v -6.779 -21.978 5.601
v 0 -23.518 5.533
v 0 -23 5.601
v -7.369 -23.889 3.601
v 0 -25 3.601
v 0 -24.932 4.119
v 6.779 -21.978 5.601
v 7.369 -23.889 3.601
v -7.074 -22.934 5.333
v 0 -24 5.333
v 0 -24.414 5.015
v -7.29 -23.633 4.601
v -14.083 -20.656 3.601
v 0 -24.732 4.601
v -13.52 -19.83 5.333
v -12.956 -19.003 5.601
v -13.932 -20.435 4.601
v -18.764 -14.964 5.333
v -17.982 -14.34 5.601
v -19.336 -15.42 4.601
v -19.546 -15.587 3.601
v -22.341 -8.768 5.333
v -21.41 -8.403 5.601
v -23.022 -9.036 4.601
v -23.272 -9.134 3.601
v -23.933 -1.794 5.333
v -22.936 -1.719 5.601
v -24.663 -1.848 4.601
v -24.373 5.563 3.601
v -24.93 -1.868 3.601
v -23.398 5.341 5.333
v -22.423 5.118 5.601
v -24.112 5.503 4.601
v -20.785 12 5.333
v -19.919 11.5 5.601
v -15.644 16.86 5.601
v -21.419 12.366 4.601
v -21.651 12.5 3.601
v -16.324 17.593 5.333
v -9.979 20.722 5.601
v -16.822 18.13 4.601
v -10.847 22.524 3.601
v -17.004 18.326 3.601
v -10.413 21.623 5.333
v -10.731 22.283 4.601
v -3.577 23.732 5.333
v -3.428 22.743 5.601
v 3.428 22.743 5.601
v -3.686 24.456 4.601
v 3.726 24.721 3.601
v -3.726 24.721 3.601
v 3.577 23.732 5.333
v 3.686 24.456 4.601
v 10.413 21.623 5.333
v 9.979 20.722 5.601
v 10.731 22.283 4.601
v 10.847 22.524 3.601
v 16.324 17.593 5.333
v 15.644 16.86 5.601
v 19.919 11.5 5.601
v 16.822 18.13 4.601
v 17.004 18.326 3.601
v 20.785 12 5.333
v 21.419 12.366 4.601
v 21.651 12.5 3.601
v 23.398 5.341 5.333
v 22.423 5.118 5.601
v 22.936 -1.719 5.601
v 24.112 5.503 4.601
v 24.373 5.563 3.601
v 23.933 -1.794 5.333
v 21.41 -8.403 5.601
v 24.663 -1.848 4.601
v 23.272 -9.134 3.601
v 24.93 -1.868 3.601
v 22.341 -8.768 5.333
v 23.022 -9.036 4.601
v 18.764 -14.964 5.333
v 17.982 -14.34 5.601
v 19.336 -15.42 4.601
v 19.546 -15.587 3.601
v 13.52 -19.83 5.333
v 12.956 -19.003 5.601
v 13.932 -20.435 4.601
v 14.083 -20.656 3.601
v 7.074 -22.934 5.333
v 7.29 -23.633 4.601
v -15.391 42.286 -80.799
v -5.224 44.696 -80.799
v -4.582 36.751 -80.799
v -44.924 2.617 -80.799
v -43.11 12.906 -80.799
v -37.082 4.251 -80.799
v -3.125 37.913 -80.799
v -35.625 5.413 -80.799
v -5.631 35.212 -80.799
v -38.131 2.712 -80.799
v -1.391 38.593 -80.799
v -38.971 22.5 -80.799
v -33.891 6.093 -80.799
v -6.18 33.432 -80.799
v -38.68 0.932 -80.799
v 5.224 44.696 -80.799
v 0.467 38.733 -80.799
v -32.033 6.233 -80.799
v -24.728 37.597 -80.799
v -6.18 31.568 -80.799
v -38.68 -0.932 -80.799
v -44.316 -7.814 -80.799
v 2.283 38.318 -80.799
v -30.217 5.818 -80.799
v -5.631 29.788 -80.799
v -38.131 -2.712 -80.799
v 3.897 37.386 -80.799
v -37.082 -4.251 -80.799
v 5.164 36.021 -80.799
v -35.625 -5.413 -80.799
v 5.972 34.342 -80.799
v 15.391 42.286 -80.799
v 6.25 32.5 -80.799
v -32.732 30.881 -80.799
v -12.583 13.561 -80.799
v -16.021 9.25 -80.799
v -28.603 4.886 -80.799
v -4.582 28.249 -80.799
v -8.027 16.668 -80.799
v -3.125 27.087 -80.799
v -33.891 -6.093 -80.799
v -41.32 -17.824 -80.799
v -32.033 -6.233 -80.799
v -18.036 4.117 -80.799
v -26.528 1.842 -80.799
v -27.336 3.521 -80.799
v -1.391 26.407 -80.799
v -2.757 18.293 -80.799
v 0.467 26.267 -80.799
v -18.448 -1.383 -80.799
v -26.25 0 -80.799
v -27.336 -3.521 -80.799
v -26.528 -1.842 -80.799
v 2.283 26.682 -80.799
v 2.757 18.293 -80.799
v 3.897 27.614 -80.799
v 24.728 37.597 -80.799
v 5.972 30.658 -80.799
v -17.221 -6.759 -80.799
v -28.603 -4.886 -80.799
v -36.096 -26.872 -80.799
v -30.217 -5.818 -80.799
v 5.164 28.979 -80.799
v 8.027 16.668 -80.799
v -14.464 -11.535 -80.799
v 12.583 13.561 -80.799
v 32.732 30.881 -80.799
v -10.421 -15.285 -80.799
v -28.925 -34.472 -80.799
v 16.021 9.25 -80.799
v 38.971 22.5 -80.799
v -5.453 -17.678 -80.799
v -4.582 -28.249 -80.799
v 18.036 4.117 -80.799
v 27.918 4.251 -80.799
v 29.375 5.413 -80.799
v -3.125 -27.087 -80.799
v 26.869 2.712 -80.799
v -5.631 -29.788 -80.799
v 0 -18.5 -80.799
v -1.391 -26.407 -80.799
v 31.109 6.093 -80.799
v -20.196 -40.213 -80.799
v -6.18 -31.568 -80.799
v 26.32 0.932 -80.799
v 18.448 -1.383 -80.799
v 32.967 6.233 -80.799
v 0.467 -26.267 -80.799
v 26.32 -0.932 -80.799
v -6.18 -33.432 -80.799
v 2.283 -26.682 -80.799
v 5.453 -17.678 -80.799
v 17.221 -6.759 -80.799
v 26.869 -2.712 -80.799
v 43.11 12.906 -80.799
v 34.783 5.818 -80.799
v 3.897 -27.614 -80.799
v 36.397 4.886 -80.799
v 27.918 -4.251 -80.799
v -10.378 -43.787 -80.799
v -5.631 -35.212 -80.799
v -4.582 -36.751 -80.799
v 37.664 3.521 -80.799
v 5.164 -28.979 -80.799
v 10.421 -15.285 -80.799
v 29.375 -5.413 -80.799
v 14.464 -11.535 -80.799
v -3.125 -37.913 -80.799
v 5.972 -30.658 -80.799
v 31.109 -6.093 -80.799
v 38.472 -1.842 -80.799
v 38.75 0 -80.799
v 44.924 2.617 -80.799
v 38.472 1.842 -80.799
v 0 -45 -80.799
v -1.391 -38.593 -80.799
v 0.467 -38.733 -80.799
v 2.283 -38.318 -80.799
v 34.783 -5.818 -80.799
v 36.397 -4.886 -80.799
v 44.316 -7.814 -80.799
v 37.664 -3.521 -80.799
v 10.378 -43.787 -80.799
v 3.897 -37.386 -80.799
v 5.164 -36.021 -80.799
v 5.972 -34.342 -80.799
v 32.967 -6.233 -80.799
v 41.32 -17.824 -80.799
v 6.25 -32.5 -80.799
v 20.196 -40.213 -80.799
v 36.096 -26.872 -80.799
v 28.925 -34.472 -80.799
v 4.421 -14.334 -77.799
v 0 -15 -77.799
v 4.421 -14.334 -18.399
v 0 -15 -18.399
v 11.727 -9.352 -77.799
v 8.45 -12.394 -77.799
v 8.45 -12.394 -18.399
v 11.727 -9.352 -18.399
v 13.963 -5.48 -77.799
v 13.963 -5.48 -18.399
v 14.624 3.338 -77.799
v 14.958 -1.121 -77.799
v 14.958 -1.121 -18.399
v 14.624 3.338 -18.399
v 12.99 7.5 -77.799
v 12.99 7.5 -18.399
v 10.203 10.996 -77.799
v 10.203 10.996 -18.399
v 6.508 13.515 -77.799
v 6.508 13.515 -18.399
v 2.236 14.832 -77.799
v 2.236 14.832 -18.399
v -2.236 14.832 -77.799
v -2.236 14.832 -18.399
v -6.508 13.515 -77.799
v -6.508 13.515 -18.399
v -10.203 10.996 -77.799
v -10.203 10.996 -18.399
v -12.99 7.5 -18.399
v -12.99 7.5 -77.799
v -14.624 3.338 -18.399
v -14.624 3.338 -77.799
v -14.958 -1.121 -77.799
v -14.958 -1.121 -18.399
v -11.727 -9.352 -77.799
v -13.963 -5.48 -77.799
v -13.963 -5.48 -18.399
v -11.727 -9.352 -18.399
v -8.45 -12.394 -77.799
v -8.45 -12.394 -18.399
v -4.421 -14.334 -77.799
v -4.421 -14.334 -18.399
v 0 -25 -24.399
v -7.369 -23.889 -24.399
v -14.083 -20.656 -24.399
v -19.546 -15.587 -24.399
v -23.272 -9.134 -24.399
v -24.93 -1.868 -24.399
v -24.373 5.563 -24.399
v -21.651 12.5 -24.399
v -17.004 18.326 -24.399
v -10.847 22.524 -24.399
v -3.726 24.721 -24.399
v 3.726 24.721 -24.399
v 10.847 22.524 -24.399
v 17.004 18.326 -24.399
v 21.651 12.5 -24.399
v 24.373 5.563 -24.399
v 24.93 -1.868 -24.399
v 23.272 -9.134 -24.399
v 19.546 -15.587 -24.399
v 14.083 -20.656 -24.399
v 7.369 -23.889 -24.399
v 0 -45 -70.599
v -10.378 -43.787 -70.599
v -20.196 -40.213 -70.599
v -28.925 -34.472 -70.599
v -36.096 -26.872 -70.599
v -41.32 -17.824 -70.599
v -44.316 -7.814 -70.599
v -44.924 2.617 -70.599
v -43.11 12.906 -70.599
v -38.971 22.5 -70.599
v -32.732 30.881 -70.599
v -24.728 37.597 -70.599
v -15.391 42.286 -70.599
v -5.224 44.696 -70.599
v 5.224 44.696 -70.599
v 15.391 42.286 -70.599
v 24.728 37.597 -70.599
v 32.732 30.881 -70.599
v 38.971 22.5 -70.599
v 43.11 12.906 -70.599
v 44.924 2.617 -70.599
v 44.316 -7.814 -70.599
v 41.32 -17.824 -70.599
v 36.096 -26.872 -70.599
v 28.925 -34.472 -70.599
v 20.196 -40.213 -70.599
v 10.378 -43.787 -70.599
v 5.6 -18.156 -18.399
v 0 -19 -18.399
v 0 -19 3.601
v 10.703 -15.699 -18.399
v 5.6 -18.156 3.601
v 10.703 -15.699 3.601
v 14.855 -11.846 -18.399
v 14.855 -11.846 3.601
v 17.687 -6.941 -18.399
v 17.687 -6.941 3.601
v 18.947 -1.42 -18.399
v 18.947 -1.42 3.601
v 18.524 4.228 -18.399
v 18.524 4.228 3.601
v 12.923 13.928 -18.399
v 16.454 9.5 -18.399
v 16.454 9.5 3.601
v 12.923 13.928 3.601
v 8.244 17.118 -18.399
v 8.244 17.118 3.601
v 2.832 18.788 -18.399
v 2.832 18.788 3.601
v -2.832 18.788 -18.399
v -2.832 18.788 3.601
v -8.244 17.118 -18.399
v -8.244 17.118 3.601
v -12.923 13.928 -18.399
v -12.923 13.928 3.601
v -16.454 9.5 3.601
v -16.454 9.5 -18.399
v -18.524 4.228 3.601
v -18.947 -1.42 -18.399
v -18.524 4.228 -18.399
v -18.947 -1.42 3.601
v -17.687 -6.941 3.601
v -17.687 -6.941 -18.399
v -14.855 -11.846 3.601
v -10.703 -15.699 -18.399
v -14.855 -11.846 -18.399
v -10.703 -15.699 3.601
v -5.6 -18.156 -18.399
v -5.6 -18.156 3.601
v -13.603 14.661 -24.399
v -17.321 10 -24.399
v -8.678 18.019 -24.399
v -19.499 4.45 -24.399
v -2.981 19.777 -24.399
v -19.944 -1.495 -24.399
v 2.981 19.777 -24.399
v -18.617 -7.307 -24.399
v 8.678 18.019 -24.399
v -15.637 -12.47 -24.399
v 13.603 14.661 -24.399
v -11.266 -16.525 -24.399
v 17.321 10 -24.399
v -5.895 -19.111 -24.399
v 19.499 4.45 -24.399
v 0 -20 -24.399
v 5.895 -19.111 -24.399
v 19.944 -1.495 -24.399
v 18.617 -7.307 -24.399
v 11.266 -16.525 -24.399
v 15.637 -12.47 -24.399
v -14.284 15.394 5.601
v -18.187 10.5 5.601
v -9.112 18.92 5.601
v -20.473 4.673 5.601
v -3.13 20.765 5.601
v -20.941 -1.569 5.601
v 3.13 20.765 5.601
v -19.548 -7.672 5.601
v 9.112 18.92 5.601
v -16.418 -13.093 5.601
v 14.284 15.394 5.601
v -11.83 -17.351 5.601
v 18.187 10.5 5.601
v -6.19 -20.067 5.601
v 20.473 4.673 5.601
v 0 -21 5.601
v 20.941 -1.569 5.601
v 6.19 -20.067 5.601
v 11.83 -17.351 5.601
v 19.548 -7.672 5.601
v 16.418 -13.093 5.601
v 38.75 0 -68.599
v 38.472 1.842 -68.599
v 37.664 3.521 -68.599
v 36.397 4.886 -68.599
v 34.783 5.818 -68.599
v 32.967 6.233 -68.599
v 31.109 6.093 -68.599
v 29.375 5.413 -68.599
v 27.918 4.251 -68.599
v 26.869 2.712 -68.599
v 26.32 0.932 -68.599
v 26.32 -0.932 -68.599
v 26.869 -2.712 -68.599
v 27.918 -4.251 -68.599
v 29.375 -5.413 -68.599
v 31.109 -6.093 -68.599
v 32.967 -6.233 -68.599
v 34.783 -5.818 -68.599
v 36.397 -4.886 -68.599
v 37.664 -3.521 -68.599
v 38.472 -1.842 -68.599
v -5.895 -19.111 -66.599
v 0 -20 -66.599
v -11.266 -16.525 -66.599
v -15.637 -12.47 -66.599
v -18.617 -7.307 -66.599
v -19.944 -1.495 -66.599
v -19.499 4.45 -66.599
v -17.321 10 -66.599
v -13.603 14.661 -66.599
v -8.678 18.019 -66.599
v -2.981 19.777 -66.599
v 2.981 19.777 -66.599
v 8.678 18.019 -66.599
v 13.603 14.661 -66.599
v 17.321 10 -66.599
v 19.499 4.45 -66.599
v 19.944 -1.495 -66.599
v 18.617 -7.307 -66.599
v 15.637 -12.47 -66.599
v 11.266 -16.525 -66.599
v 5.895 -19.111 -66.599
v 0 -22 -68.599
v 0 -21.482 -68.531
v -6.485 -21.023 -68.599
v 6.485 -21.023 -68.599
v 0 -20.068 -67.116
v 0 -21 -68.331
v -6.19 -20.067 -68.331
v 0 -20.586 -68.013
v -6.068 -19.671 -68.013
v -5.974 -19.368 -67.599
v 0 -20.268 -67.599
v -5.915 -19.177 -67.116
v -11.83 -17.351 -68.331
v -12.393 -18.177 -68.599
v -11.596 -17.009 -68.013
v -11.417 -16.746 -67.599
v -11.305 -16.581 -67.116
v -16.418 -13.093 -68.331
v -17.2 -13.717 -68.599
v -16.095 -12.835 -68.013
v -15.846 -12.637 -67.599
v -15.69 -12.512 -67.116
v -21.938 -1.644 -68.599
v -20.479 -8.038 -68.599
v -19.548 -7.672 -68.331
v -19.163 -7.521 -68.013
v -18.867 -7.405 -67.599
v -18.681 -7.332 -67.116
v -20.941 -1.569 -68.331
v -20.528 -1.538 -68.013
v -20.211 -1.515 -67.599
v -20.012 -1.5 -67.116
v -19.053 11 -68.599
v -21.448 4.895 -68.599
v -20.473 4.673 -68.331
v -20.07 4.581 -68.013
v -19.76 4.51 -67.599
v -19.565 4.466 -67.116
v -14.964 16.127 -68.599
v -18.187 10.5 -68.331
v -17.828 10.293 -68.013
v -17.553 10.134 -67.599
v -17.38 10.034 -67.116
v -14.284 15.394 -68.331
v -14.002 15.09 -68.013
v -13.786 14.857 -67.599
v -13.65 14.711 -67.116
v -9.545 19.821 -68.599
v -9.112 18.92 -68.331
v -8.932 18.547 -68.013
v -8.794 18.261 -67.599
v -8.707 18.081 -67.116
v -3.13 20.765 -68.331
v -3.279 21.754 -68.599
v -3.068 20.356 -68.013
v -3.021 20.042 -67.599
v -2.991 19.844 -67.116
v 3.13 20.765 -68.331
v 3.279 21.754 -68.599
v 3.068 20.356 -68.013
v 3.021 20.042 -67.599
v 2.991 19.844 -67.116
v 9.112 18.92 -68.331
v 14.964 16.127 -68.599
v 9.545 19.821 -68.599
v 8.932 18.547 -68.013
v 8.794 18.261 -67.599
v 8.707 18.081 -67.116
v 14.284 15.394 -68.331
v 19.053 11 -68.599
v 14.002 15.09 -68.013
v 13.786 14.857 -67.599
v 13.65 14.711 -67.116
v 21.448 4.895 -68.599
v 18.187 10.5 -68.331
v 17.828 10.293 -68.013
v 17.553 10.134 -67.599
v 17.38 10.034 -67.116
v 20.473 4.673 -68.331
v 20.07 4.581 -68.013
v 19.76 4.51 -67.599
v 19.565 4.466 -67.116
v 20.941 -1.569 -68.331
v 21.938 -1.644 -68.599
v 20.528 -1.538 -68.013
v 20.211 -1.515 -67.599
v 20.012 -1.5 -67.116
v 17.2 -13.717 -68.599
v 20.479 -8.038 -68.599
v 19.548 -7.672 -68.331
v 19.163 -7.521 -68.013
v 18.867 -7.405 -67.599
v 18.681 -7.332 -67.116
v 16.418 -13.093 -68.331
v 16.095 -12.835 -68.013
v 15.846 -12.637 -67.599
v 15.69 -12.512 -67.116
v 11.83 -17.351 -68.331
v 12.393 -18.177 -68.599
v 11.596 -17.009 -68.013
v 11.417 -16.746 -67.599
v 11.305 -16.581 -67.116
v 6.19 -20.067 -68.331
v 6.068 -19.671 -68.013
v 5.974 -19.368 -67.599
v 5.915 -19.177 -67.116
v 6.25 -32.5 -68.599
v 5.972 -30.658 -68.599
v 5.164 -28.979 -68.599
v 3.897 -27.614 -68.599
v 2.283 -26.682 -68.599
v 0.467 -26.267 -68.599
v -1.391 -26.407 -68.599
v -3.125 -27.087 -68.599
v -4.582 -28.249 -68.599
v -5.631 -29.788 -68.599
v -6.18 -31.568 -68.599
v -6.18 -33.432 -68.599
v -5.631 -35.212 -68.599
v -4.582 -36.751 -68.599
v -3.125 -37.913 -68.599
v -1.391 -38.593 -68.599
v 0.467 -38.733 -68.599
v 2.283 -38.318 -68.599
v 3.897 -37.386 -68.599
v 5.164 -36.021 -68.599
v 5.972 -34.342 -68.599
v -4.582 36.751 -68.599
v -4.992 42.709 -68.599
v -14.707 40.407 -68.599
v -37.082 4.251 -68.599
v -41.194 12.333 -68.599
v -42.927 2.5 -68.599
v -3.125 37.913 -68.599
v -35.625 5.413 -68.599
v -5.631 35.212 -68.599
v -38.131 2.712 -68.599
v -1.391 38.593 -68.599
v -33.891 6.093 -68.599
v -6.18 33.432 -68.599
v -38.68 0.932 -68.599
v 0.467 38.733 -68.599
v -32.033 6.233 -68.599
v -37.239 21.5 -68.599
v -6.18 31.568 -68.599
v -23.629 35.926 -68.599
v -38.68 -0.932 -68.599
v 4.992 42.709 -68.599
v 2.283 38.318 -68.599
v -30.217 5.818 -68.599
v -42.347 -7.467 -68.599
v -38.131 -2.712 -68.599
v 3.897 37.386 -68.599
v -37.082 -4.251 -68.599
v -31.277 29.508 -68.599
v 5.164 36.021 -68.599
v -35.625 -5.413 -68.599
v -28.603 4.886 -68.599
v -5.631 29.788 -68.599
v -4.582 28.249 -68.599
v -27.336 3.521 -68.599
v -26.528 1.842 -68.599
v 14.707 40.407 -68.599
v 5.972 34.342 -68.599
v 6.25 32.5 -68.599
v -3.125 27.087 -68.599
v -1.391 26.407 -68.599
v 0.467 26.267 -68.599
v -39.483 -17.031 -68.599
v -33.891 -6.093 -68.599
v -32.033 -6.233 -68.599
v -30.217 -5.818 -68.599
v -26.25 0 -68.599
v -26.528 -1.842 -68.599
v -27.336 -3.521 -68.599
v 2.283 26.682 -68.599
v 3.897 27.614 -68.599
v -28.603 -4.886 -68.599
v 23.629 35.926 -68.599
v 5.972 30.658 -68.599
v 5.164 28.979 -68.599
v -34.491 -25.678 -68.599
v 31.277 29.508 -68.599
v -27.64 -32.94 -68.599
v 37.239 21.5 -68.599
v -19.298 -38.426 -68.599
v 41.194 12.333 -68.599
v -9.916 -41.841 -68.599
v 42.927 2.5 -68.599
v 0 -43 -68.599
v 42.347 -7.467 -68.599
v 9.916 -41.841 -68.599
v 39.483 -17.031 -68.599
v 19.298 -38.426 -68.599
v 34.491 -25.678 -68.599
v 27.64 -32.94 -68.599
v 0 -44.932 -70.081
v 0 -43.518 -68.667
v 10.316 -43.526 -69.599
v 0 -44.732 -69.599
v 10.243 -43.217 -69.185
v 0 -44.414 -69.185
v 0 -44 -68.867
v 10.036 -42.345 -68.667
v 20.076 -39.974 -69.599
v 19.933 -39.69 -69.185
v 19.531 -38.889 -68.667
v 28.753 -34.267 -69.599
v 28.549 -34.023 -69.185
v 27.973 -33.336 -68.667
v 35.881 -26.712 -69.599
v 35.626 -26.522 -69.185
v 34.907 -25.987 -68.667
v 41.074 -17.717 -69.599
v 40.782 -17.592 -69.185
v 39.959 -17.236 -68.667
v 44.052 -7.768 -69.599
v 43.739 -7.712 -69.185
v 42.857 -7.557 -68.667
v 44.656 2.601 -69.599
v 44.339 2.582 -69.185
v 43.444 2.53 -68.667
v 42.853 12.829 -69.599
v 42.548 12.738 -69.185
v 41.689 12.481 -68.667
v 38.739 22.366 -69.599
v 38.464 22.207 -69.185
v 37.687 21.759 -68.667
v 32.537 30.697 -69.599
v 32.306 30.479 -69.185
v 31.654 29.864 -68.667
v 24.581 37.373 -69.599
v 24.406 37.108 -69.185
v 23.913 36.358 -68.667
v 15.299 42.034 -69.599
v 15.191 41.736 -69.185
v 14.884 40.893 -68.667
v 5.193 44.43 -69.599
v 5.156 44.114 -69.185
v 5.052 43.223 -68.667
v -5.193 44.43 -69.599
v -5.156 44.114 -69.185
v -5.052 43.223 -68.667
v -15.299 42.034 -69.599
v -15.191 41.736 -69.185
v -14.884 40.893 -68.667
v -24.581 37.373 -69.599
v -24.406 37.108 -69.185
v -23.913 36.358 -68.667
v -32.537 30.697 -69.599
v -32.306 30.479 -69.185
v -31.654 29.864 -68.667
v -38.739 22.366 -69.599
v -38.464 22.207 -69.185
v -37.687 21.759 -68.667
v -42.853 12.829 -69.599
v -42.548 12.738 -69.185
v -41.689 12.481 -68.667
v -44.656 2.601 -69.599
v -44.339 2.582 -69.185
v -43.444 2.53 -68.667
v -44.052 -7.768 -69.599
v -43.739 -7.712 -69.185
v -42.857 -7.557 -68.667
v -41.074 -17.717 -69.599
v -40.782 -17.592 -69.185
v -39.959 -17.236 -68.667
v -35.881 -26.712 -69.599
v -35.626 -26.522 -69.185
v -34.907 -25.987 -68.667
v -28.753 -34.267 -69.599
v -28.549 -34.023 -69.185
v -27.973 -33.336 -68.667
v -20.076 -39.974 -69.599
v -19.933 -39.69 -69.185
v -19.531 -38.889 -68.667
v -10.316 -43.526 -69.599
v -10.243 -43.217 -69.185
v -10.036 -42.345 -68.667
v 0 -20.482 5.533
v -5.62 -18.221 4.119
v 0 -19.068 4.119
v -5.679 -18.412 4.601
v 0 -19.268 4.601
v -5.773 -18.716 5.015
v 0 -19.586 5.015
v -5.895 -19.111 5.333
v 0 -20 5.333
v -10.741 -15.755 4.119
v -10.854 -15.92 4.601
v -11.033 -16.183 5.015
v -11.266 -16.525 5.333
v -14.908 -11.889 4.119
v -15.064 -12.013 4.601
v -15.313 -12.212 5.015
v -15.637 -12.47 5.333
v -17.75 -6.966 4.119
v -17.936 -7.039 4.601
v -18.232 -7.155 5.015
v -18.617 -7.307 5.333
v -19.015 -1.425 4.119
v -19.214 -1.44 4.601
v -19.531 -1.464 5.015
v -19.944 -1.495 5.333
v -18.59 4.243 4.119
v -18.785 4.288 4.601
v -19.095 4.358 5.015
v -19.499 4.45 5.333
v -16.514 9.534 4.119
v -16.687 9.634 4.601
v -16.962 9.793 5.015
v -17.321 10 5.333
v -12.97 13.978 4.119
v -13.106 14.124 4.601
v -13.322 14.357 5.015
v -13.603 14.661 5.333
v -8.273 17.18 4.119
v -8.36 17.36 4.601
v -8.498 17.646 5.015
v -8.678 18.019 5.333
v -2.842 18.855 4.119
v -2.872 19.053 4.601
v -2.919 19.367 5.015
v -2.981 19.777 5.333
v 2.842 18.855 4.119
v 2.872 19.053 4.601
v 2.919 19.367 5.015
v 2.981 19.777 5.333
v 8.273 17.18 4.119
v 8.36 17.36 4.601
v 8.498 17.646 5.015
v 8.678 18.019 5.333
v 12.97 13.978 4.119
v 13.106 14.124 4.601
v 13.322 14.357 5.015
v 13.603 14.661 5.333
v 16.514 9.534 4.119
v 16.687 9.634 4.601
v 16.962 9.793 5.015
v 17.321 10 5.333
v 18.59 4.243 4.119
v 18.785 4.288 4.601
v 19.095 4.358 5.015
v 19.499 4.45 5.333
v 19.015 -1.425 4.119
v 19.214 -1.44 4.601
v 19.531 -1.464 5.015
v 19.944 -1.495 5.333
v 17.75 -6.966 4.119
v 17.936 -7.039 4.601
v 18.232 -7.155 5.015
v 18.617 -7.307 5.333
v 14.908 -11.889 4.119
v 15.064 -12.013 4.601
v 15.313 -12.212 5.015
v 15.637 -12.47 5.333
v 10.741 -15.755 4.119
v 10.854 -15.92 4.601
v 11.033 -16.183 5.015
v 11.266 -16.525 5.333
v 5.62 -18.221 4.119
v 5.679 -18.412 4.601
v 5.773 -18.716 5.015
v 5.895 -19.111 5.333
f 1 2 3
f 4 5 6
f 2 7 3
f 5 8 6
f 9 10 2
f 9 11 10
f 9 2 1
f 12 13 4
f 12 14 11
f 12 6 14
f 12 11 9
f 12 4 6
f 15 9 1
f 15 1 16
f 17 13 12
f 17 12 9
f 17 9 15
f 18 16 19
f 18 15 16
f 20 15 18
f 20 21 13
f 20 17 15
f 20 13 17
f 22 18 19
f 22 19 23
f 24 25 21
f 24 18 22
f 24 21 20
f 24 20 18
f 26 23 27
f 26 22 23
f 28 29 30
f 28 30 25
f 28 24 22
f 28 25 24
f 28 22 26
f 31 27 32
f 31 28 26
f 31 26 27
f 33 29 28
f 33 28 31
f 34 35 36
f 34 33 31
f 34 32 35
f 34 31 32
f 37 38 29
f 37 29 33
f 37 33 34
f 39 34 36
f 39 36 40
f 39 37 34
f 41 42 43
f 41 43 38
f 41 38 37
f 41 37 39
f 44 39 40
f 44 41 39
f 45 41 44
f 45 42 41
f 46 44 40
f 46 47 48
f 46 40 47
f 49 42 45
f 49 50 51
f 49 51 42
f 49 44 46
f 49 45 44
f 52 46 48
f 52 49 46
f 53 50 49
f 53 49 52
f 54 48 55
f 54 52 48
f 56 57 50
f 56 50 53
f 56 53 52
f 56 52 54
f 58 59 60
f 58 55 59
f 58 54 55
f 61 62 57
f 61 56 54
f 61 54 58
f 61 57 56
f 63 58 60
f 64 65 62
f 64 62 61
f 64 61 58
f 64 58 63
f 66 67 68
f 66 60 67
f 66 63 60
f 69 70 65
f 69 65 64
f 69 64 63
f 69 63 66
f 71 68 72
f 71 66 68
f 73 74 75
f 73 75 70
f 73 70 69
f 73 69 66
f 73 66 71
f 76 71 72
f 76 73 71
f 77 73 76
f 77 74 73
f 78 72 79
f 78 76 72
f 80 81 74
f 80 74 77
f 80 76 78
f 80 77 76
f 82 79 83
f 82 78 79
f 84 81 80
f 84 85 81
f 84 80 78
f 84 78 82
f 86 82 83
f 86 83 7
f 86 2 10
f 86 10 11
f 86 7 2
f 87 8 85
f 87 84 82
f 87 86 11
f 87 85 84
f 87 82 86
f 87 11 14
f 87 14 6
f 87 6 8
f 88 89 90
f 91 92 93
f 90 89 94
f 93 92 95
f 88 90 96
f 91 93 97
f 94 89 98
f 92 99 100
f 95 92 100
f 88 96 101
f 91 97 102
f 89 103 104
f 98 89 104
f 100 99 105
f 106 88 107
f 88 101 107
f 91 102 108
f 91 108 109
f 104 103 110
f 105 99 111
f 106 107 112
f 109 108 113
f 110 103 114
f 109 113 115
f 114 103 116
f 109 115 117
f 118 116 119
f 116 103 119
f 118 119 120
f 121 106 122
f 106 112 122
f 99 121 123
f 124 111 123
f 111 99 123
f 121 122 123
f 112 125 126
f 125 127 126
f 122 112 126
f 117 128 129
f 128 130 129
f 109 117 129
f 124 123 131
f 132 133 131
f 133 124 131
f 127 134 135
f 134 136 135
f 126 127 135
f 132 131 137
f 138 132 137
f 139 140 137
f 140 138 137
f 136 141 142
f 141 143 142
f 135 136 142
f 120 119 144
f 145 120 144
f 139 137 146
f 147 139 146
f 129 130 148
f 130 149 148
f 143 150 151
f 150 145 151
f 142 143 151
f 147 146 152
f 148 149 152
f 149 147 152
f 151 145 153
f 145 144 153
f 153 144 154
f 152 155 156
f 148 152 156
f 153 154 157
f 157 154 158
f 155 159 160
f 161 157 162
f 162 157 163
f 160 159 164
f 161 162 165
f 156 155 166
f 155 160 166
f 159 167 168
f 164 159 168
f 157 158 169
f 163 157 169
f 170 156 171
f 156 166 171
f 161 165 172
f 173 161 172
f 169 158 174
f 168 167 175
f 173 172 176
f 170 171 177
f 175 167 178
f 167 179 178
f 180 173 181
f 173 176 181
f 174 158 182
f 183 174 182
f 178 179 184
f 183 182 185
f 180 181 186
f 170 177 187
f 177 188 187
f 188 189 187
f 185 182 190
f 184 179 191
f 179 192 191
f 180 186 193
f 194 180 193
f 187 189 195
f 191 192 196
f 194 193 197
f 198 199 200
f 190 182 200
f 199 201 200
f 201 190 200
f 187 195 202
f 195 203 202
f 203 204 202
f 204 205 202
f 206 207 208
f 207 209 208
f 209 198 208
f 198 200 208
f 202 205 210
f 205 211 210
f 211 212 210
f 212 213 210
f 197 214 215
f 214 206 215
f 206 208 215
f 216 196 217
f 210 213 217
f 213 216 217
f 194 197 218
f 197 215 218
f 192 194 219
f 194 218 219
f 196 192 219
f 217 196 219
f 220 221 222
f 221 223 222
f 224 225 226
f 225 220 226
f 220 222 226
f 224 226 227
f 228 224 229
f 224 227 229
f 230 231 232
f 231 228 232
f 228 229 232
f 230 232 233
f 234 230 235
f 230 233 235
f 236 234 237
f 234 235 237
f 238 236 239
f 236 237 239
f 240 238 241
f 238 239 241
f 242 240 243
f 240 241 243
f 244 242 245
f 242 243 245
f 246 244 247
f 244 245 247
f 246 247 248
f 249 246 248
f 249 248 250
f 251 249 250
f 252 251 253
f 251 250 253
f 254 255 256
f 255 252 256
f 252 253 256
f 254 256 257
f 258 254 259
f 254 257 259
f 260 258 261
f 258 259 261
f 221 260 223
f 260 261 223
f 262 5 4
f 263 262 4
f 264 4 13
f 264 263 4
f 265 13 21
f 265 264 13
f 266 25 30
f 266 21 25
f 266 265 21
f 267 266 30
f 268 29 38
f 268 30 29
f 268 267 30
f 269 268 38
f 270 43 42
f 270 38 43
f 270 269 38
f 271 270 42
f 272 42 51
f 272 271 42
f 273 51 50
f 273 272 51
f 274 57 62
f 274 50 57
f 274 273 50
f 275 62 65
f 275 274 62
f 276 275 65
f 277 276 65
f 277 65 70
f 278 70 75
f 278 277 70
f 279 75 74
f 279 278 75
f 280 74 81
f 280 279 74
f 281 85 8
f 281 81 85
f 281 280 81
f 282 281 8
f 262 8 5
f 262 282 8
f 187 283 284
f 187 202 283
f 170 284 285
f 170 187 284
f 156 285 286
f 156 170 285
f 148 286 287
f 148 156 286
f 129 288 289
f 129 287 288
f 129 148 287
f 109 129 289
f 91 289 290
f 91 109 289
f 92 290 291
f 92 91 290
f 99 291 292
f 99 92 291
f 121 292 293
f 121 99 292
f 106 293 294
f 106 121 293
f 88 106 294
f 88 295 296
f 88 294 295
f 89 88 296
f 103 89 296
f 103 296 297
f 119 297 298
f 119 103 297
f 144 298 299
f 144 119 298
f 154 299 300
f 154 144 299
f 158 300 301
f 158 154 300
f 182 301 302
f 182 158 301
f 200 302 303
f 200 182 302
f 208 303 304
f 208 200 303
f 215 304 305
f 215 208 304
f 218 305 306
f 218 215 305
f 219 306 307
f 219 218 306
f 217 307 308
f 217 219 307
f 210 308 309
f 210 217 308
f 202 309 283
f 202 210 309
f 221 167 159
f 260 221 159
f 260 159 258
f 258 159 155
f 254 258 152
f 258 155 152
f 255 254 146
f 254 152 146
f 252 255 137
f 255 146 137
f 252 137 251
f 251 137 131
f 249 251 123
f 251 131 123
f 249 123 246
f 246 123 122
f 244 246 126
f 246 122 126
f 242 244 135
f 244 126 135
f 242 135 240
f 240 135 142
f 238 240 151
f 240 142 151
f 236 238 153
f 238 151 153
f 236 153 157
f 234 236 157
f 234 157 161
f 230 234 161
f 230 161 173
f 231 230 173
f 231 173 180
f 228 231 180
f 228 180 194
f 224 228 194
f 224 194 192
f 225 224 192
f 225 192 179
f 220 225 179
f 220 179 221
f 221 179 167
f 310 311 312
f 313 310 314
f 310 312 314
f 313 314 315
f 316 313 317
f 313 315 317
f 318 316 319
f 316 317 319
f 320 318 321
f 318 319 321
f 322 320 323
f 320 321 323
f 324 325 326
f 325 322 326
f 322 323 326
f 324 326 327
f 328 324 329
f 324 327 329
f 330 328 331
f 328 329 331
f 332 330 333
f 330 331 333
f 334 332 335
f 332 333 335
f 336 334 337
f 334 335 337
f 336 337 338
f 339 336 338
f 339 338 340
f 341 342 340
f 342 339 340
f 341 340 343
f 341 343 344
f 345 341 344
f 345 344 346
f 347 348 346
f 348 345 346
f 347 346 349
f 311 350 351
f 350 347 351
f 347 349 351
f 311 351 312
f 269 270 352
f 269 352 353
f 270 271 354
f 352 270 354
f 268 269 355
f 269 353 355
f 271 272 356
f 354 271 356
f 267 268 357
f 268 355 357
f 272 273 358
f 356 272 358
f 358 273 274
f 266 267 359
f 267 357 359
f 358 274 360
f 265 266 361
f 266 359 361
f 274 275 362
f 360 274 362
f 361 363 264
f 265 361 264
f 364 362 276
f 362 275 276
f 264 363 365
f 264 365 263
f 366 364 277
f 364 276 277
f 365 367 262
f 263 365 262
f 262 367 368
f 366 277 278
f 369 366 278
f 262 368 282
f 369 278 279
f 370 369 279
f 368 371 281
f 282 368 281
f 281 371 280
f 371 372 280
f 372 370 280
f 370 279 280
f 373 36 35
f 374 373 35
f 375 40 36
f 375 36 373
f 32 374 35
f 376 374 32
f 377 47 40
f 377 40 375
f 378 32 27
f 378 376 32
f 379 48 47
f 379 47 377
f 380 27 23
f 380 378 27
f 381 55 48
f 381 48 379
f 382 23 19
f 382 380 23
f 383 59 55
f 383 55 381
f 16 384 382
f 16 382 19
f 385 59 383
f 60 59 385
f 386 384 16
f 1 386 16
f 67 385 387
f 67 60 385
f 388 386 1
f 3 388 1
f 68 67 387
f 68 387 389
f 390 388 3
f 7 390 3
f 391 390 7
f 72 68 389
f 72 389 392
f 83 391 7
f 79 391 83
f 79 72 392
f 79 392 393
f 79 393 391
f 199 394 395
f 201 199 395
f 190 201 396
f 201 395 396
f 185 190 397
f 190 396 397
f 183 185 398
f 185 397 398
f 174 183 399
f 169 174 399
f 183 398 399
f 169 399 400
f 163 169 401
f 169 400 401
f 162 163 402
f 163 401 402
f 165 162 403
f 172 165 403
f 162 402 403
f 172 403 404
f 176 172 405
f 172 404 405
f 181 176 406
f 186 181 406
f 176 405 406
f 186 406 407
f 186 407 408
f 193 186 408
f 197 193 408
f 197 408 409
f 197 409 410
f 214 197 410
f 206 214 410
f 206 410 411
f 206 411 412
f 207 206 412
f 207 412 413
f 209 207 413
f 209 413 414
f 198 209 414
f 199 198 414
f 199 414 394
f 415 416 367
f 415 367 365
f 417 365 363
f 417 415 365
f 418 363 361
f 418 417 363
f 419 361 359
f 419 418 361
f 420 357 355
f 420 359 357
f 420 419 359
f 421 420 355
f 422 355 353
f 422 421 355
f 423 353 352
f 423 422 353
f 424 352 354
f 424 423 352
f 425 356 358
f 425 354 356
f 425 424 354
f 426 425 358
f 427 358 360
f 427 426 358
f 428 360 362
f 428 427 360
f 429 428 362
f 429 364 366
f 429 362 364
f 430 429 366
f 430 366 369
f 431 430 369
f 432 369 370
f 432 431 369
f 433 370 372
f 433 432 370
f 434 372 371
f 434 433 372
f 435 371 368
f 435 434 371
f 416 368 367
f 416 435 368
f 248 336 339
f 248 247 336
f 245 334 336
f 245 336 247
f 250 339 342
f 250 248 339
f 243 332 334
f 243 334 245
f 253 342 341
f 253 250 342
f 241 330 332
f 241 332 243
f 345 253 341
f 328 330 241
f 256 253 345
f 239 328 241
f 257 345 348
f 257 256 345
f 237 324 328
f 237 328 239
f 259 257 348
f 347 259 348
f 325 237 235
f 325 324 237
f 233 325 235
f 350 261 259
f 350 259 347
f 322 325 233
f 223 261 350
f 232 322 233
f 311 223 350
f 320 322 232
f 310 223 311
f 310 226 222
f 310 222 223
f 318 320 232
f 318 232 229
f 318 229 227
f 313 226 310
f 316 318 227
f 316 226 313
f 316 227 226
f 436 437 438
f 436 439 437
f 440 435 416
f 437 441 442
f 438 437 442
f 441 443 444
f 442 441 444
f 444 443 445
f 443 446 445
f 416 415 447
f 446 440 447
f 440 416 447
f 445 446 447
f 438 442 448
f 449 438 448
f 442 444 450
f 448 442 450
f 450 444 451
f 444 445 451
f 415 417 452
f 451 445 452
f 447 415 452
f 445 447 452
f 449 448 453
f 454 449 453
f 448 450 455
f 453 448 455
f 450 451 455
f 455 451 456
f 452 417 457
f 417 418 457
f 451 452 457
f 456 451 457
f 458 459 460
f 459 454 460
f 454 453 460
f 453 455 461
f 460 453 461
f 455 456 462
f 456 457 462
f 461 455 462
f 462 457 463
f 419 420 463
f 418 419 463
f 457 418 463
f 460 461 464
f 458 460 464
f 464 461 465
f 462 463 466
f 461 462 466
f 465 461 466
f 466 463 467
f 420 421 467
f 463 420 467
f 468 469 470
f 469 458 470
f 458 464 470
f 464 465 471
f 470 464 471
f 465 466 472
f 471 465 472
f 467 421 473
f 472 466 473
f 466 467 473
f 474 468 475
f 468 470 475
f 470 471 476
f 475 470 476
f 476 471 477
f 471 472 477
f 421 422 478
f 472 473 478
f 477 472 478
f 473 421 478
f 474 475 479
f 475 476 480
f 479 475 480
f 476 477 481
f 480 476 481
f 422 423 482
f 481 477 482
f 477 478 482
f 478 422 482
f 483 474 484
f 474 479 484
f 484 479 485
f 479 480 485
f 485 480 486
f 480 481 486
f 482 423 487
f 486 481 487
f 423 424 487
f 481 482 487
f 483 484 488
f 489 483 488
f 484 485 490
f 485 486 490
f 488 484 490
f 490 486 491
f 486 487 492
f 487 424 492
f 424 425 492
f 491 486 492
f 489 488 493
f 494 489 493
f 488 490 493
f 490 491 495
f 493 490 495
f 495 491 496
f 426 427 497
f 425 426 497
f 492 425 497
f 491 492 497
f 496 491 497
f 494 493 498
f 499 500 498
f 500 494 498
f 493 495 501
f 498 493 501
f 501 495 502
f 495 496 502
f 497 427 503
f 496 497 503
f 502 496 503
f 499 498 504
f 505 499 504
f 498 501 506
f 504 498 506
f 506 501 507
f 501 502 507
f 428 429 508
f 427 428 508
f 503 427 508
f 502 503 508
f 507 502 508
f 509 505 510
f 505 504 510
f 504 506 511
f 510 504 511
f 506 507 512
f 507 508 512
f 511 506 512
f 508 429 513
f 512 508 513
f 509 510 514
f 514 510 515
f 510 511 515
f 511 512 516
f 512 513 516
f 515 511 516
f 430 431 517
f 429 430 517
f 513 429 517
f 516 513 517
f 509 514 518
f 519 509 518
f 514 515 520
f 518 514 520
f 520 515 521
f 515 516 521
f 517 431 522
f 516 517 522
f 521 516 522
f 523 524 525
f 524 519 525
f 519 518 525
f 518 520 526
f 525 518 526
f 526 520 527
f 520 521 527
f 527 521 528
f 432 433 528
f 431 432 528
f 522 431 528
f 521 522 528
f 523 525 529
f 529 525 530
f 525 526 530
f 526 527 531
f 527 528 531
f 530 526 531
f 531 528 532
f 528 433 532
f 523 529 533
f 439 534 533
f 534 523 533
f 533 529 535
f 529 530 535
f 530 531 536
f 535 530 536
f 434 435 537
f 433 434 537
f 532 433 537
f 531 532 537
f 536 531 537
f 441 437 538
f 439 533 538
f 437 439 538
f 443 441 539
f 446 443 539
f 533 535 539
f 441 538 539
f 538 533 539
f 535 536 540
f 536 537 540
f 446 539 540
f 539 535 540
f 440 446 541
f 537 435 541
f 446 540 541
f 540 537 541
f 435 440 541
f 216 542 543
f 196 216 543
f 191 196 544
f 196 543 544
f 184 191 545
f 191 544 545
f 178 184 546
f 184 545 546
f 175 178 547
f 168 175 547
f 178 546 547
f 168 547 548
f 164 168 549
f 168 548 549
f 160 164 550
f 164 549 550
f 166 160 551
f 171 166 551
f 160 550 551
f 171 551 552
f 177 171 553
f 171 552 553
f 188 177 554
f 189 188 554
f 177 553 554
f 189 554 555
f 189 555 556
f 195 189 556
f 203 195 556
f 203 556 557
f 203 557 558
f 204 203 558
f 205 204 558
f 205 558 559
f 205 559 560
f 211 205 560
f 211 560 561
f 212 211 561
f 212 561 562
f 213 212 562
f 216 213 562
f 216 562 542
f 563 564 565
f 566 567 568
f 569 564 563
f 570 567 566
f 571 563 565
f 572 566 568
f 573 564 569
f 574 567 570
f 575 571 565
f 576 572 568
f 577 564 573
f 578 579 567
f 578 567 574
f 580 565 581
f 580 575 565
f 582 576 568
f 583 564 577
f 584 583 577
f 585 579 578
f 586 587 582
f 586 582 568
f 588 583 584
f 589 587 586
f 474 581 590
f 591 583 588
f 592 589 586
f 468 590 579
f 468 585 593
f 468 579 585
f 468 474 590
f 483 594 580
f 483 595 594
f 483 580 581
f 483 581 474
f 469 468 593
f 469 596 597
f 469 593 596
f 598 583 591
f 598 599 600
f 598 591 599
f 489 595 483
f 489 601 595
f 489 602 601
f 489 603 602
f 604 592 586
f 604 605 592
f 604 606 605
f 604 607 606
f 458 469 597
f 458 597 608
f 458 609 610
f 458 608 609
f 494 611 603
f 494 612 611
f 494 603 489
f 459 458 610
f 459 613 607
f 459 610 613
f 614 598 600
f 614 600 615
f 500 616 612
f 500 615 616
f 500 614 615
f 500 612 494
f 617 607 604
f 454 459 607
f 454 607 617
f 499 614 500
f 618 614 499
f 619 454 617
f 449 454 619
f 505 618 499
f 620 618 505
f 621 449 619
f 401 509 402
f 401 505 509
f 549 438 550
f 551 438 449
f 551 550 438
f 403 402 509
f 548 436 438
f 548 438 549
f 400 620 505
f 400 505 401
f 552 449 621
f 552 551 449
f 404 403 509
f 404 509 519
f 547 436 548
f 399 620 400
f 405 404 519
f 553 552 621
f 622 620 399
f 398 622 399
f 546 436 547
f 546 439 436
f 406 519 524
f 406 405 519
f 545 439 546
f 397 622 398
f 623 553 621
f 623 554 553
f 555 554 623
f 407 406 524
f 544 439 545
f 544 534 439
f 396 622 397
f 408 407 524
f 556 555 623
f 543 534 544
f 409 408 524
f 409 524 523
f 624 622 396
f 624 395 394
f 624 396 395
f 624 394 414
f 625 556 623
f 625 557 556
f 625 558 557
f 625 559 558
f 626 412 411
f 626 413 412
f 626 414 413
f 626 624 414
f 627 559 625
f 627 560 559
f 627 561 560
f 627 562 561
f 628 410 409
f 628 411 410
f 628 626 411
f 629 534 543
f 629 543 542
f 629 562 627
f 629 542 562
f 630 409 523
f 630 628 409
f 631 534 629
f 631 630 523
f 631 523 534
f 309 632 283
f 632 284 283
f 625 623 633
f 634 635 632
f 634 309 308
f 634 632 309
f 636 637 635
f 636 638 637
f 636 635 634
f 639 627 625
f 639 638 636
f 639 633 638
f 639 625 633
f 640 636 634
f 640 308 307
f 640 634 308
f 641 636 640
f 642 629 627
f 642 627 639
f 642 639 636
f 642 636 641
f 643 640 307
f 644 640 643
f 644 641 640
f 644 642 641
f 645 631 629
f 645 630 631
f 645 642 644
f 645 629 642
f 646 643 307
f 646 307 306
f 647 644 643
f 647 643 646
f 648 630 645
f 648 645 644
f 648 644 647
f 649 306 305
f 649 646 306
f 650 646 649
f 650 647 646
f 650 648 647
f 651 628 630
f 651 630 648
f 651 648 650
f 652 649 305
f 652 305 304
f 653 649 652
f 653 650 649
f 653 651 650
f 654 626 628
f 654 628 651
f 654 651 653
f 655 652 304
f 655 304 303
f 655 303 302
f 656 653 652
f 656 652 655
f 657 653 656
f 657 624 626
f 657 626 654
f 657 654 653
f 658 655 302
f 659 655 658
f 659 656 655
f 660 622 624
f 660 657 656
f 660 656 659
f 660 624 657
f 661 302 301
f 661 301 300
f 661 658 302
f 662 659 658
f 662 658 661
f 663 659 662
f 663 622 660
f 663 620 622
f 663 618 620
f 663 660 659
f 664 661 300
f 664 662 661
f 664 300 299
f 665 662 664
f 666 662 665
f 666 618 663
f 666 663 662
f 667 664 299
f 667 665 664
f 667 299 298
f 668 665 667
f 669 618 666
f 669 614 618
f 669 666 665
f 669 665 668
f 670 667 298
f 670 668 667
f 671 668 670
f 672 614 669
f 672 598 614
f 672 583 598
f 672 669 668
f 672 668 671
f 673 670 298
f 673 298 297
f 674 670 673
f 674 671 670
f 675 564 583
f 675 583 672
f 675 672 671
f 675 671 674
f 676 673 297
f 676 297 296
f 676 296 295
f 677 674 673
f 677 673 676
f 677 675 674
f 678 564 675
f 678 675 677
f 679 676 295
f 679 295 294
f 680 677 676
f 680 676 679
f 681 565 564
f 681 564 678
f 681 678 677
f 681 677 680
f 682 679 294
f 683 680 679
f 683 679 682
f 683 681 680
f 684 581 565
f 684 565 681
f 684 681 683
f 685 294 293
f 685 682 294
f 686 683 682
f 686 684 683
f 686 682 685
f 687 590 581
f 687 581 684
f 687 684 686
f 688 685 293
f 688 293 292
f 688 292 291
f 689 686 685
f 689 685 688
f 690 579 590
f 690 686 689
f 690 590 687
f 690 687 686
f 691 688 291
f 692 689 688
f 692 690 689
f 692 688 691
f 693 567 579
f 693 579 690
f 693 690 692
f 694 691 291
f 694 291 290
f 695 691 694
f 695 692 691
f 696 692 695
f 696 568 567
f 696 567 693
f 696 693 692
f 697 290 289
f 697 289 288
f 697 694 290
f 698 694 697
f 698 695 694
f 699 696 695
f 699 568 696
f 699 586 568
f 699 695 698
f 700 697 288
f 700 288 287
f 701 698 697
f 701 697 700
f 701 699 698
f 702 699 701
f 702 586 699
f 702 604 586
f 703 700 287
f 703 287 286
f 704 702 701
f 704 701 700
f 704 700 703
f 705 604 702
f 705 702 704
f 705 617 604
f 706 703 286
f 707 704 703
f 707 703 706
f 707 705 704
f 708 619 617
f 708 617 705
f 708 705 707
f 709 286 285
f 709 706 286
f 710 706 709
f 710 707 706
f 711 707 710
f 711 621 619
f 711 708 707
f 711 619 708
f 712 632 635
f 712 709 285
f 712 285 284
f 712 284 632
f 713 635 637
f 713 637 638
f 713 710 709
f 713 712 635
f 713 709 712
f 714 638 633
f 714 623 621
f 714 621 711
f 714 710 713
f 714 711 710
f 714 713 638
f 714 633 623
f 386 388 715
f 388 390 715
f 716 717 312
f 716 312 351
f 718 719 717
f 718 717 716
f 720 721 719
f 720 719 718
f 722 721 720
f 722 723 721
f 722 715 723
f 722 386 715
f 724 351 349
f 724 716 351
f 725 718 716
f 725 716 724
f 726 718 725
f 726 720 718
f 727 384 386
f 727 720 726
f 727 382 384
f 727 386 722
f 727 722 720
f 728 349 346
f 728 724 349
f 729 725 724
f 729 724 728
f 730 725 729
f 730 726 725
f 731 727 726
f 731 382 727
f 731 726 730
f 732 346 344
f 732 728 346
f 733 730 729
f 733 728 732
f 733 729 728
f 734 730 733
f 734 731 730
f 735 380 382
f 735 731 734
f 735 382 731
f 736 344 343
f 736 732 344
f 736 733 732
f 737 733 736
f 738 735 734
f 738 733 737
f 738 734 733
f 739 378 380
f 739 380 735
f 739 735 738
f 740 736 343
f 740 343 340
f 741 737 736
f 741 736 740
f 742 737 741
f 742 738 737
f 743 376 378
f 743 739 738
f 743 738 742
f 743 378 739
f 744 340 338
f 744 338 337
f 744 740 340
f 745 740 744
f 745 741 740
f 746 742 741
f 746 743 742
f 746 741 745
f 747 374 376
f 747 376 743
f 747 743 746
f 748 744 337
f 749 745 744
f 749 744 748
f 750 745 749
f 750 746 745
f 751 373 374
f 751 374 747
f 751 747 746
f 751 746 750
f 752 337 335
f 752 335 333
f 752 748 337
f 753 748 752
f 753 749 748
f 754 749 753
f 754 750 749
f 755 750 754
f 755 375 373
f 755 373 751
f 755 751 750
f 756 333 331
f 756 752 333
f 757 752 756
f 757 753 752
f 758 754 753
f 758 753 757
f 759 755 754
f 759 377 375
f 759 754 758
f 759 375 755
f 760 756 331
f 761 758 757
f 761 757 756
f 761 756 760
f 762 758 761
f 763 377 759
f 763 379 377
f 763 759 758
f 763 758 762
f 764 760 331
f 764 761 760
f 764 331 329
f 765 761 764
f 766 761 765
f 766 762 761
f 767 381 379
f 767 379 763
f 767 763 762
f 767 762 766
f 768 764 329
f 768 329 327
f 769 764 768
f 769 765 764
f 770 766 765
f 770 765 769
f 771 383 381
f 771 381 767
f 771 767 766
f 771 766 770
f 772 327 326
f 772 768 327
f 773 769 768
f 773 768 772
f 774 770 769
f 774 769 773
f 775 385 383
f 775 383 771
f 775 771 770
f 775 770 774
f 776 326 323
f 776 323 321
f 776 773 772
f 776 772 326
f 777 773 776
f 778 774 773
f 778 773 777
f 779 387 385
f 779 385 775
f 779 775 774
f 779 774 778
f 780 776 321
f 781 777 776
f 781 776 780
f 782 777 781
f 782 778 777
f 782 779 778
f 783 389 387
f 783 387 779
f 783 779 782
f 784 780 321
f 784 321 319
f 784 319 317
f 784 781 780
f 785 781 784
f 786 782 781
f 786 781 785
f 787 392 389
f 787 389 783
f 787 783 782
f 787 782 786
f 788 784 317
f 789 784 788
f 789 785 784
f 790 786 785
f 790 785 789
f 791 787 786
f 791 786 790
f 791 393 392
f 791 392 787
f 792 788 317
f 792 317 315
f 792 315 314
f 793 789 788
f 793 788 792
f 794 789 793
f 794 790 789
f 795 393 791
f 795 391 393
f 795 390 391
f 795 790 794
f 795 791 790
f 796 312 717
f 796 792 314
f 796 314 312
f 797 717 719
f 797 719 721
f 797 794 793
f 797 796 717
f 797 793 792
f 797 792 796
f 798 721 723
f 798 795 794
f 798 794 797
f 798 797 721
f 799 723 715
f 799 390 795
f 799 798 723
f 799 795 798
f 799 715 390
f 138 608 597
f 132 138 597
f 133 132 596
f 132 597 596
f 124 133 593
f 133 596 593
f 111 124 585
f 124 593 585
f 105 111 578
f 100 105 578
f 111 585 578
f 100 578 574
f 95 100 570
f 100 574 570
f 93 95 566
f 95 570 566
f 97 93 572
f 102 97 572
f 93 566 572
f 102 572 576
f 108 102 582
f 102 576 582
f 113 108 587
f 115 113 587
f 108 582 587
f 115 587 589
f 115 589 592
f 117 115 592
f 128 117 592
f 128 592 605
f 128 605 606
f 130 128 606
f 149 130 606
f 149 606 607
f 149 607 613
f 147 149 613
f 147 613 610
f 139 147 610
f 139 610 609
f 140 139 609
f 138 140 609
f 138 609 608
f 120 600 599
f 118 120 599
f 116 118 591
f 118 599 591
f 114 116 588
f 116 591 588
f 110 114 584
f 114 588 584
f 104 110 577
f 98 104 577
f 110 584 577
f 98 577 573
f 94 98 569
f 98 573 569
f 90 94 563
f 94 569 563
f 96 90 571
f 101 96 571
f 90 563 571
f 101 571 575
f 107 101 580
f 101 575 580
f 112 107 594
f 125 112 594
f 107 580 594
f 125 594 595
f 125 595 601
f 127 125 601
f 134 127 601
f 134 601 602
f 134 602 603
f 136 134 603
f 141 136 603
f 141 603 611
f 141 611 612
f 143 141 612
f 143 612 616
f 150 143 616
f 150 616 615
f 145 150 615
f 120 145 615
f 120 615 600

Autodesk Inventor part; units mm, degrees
ref_plane "YZ Plane" through (0, 0, 0) normal (1, 0, 0) x (0, 1, 0)
ref_plane "XZ Plane" through (0, 0, 0) normal (0, 1, 0) x (-1, 0, 0)
ref_plane "XY Plane" through (0, 0, 0) normal (0, 0, 1) x (1, 0, 0)
sketch "Boceto1" plane through (0, 0, 0) normal (1, 0, 0) x (0, 1, 0)
  line L0 (25, 5.601225) -> (19, 5.601225)
  line L1 (19, 5.601225) -> (19, -18.398775)
  line L2 (19, -18.398775) -> (15, -18.398775)
  line L3 (15, -18.398775) -> (15, -80.798775)
  line L4 (15, -80.798775) -> (45, -80.798775)
  line L5 (45, -80.798775) -> (45, -68.598775)
  line L6 (45, -68.598775) -> (20, -68.598775)
  line L7 (20, -68.598775) -> (20, -24.398775)
  line L8 (20, -24.398775) -> (25, -24.398775)
  line L9 (25, -24.398775) -> (25, 5.601225)
  line L10 (0, 0) -> (0, 11.507163) construction
  line L11 (-25, 5.601225) -> (-19, 5.601225)
  line L12 (-19, 5.601225) -> (-19, -18.398775)
  line L13 (-19, -18.398775) -> (-15, -18.398775)
  line L14 (-15, -18.398775) -> (-15, -80.798775)
  line L15 (-15, -80.798775) -> (-45, -80.798775)
  line L16 (-45, -80.798775) -> (-45, -68.598775)
  line L17 (-45, -68.598775) -> (-20, -68.598775)
  line L18 (-20, -68.598775) -> (-20, -24.398775)
  line L19 (-20, -24.398775) -> (-25, -24.398775)
  line L20 (-25, -24.398775) -> (-25, 5.601225)
  dimension "d0" = 30
  dimension "d1" = 40
  dimension "d2" = 90
  dimension "d3" = 38
  dimension "d4" = 50
  dimension "d5" = 24
  dimension "d6" = 6
  dimension "d7" = 44.2
  dimension "d8" = 12.2
sketch "Boceto1 outline for Revolución1" plane through (0, 0, 0) normal (1, 0, 0) x (0, 1, 0)
  line L0 (-25, 5.601225) -> (-25, -24.398775)
  line L1 (-19, 5.601225) -> (-25, 5.601225)
  line L2 (-19, -18.398775) -> (-19, 5.601225)
  line L3 (-15, -18.398775) -> (-19, -18.398775)
  line L4 (-15, -80.798775) -> (-15, -18.398775)
  line L5 (-45, -80.798775) -> (-15, -80.798775)
  line L6 (-45, -68.598775) -> (-45, -80.798775)
  line L7 (-20, -68.598775) -> (-45, -68.598775)
  line L8 (-20, -24.398775) -> (-20, -68.598775)
  line L9 (-25, -24.398775) -> (-20, -24.398775)
  line L10 (25, 5.601225) -> (19, 5.601225)
  line L11 (25, -24.398775) -> (25, 5.601225)
  line L12 (20, -24.398775) -> (25, -24.398775)
  line L13 (20, -68.598775) -> (20, -24.398775)
  line L14 (45, -68.598775) -> (20, -68.598775)
  line L15 (45, -80.798775) -> (45, -68.598775)
  line L16 (15, -80.798775) -> (45, -80.798775)
  line L17 (15, -18.398775) -> (15, -80.798775)
  line L18 (19, -18.398775) -> (15, -18.398775)
  line L19 (19, 5.601225) -> (19, -18.398775)
revolve "Revolución1" add sketch "Boceto1 outline for Revolución1" angle 360 about axis through (0, 0, 0) along (0, 0, 1)
sketch "Boceto4" plane through (0, 0, -68.598775) normal (0, 0, 1) x (1, 0, 0)
  circle A0 centre (0, -32.5) radius 6.25
  circle A1 centre (0, 32.5) radius 6.25
  circle A2 centre (-32.5, 0) radius 6.25
  circle A3 centre (32.5, 0) radius 6.25
  circle A4 centre (0, -32.5) radius 6.25
  circle A5 centre (0, 32.5) radius 6.25
  circle A6 centre (32.5, 0) radius 6.25
  circle A7 centre (-32.5, 0) radius 6.25
  point P0 (0, 0)
  dimension "d18" = 12.5
  dimension "d19" = 12.5
  dimension "d20" = 65
  dimension "d21" = 32.5
  dimension "d24" = 360
sketch "Boceto4 outline for Extrusión1" plane through (0, 0, -68.598775) normal (0, 0, 1) x (1, 0, 0)
  circle A0 centre (-32.5, 0) radius 6.25
  circle A1 centre (0, -32.5) radius 6.25
  circle A2 centre (32.5, 0) radius 6.25
  circle A3 centre (0, 32.5) radius 6.25
extrude "Extrusión1" cut sketch "Boceto4 outline for Extrusión1" against normal through all
chamfer "Chaflán1" distance 3 distance2 3.5 1 edges at (0, 15, -80.7988) measured on face at (2.4062, -14.8058, -59.9988)
fillet "Empalme1" radius 2 4 edges at (0, 45, -68.5988) (0, 20, -68.5988) (0, 25, 5.6012) (0, 19, 5.6012)
properties part number "Pieza de practica 2"
